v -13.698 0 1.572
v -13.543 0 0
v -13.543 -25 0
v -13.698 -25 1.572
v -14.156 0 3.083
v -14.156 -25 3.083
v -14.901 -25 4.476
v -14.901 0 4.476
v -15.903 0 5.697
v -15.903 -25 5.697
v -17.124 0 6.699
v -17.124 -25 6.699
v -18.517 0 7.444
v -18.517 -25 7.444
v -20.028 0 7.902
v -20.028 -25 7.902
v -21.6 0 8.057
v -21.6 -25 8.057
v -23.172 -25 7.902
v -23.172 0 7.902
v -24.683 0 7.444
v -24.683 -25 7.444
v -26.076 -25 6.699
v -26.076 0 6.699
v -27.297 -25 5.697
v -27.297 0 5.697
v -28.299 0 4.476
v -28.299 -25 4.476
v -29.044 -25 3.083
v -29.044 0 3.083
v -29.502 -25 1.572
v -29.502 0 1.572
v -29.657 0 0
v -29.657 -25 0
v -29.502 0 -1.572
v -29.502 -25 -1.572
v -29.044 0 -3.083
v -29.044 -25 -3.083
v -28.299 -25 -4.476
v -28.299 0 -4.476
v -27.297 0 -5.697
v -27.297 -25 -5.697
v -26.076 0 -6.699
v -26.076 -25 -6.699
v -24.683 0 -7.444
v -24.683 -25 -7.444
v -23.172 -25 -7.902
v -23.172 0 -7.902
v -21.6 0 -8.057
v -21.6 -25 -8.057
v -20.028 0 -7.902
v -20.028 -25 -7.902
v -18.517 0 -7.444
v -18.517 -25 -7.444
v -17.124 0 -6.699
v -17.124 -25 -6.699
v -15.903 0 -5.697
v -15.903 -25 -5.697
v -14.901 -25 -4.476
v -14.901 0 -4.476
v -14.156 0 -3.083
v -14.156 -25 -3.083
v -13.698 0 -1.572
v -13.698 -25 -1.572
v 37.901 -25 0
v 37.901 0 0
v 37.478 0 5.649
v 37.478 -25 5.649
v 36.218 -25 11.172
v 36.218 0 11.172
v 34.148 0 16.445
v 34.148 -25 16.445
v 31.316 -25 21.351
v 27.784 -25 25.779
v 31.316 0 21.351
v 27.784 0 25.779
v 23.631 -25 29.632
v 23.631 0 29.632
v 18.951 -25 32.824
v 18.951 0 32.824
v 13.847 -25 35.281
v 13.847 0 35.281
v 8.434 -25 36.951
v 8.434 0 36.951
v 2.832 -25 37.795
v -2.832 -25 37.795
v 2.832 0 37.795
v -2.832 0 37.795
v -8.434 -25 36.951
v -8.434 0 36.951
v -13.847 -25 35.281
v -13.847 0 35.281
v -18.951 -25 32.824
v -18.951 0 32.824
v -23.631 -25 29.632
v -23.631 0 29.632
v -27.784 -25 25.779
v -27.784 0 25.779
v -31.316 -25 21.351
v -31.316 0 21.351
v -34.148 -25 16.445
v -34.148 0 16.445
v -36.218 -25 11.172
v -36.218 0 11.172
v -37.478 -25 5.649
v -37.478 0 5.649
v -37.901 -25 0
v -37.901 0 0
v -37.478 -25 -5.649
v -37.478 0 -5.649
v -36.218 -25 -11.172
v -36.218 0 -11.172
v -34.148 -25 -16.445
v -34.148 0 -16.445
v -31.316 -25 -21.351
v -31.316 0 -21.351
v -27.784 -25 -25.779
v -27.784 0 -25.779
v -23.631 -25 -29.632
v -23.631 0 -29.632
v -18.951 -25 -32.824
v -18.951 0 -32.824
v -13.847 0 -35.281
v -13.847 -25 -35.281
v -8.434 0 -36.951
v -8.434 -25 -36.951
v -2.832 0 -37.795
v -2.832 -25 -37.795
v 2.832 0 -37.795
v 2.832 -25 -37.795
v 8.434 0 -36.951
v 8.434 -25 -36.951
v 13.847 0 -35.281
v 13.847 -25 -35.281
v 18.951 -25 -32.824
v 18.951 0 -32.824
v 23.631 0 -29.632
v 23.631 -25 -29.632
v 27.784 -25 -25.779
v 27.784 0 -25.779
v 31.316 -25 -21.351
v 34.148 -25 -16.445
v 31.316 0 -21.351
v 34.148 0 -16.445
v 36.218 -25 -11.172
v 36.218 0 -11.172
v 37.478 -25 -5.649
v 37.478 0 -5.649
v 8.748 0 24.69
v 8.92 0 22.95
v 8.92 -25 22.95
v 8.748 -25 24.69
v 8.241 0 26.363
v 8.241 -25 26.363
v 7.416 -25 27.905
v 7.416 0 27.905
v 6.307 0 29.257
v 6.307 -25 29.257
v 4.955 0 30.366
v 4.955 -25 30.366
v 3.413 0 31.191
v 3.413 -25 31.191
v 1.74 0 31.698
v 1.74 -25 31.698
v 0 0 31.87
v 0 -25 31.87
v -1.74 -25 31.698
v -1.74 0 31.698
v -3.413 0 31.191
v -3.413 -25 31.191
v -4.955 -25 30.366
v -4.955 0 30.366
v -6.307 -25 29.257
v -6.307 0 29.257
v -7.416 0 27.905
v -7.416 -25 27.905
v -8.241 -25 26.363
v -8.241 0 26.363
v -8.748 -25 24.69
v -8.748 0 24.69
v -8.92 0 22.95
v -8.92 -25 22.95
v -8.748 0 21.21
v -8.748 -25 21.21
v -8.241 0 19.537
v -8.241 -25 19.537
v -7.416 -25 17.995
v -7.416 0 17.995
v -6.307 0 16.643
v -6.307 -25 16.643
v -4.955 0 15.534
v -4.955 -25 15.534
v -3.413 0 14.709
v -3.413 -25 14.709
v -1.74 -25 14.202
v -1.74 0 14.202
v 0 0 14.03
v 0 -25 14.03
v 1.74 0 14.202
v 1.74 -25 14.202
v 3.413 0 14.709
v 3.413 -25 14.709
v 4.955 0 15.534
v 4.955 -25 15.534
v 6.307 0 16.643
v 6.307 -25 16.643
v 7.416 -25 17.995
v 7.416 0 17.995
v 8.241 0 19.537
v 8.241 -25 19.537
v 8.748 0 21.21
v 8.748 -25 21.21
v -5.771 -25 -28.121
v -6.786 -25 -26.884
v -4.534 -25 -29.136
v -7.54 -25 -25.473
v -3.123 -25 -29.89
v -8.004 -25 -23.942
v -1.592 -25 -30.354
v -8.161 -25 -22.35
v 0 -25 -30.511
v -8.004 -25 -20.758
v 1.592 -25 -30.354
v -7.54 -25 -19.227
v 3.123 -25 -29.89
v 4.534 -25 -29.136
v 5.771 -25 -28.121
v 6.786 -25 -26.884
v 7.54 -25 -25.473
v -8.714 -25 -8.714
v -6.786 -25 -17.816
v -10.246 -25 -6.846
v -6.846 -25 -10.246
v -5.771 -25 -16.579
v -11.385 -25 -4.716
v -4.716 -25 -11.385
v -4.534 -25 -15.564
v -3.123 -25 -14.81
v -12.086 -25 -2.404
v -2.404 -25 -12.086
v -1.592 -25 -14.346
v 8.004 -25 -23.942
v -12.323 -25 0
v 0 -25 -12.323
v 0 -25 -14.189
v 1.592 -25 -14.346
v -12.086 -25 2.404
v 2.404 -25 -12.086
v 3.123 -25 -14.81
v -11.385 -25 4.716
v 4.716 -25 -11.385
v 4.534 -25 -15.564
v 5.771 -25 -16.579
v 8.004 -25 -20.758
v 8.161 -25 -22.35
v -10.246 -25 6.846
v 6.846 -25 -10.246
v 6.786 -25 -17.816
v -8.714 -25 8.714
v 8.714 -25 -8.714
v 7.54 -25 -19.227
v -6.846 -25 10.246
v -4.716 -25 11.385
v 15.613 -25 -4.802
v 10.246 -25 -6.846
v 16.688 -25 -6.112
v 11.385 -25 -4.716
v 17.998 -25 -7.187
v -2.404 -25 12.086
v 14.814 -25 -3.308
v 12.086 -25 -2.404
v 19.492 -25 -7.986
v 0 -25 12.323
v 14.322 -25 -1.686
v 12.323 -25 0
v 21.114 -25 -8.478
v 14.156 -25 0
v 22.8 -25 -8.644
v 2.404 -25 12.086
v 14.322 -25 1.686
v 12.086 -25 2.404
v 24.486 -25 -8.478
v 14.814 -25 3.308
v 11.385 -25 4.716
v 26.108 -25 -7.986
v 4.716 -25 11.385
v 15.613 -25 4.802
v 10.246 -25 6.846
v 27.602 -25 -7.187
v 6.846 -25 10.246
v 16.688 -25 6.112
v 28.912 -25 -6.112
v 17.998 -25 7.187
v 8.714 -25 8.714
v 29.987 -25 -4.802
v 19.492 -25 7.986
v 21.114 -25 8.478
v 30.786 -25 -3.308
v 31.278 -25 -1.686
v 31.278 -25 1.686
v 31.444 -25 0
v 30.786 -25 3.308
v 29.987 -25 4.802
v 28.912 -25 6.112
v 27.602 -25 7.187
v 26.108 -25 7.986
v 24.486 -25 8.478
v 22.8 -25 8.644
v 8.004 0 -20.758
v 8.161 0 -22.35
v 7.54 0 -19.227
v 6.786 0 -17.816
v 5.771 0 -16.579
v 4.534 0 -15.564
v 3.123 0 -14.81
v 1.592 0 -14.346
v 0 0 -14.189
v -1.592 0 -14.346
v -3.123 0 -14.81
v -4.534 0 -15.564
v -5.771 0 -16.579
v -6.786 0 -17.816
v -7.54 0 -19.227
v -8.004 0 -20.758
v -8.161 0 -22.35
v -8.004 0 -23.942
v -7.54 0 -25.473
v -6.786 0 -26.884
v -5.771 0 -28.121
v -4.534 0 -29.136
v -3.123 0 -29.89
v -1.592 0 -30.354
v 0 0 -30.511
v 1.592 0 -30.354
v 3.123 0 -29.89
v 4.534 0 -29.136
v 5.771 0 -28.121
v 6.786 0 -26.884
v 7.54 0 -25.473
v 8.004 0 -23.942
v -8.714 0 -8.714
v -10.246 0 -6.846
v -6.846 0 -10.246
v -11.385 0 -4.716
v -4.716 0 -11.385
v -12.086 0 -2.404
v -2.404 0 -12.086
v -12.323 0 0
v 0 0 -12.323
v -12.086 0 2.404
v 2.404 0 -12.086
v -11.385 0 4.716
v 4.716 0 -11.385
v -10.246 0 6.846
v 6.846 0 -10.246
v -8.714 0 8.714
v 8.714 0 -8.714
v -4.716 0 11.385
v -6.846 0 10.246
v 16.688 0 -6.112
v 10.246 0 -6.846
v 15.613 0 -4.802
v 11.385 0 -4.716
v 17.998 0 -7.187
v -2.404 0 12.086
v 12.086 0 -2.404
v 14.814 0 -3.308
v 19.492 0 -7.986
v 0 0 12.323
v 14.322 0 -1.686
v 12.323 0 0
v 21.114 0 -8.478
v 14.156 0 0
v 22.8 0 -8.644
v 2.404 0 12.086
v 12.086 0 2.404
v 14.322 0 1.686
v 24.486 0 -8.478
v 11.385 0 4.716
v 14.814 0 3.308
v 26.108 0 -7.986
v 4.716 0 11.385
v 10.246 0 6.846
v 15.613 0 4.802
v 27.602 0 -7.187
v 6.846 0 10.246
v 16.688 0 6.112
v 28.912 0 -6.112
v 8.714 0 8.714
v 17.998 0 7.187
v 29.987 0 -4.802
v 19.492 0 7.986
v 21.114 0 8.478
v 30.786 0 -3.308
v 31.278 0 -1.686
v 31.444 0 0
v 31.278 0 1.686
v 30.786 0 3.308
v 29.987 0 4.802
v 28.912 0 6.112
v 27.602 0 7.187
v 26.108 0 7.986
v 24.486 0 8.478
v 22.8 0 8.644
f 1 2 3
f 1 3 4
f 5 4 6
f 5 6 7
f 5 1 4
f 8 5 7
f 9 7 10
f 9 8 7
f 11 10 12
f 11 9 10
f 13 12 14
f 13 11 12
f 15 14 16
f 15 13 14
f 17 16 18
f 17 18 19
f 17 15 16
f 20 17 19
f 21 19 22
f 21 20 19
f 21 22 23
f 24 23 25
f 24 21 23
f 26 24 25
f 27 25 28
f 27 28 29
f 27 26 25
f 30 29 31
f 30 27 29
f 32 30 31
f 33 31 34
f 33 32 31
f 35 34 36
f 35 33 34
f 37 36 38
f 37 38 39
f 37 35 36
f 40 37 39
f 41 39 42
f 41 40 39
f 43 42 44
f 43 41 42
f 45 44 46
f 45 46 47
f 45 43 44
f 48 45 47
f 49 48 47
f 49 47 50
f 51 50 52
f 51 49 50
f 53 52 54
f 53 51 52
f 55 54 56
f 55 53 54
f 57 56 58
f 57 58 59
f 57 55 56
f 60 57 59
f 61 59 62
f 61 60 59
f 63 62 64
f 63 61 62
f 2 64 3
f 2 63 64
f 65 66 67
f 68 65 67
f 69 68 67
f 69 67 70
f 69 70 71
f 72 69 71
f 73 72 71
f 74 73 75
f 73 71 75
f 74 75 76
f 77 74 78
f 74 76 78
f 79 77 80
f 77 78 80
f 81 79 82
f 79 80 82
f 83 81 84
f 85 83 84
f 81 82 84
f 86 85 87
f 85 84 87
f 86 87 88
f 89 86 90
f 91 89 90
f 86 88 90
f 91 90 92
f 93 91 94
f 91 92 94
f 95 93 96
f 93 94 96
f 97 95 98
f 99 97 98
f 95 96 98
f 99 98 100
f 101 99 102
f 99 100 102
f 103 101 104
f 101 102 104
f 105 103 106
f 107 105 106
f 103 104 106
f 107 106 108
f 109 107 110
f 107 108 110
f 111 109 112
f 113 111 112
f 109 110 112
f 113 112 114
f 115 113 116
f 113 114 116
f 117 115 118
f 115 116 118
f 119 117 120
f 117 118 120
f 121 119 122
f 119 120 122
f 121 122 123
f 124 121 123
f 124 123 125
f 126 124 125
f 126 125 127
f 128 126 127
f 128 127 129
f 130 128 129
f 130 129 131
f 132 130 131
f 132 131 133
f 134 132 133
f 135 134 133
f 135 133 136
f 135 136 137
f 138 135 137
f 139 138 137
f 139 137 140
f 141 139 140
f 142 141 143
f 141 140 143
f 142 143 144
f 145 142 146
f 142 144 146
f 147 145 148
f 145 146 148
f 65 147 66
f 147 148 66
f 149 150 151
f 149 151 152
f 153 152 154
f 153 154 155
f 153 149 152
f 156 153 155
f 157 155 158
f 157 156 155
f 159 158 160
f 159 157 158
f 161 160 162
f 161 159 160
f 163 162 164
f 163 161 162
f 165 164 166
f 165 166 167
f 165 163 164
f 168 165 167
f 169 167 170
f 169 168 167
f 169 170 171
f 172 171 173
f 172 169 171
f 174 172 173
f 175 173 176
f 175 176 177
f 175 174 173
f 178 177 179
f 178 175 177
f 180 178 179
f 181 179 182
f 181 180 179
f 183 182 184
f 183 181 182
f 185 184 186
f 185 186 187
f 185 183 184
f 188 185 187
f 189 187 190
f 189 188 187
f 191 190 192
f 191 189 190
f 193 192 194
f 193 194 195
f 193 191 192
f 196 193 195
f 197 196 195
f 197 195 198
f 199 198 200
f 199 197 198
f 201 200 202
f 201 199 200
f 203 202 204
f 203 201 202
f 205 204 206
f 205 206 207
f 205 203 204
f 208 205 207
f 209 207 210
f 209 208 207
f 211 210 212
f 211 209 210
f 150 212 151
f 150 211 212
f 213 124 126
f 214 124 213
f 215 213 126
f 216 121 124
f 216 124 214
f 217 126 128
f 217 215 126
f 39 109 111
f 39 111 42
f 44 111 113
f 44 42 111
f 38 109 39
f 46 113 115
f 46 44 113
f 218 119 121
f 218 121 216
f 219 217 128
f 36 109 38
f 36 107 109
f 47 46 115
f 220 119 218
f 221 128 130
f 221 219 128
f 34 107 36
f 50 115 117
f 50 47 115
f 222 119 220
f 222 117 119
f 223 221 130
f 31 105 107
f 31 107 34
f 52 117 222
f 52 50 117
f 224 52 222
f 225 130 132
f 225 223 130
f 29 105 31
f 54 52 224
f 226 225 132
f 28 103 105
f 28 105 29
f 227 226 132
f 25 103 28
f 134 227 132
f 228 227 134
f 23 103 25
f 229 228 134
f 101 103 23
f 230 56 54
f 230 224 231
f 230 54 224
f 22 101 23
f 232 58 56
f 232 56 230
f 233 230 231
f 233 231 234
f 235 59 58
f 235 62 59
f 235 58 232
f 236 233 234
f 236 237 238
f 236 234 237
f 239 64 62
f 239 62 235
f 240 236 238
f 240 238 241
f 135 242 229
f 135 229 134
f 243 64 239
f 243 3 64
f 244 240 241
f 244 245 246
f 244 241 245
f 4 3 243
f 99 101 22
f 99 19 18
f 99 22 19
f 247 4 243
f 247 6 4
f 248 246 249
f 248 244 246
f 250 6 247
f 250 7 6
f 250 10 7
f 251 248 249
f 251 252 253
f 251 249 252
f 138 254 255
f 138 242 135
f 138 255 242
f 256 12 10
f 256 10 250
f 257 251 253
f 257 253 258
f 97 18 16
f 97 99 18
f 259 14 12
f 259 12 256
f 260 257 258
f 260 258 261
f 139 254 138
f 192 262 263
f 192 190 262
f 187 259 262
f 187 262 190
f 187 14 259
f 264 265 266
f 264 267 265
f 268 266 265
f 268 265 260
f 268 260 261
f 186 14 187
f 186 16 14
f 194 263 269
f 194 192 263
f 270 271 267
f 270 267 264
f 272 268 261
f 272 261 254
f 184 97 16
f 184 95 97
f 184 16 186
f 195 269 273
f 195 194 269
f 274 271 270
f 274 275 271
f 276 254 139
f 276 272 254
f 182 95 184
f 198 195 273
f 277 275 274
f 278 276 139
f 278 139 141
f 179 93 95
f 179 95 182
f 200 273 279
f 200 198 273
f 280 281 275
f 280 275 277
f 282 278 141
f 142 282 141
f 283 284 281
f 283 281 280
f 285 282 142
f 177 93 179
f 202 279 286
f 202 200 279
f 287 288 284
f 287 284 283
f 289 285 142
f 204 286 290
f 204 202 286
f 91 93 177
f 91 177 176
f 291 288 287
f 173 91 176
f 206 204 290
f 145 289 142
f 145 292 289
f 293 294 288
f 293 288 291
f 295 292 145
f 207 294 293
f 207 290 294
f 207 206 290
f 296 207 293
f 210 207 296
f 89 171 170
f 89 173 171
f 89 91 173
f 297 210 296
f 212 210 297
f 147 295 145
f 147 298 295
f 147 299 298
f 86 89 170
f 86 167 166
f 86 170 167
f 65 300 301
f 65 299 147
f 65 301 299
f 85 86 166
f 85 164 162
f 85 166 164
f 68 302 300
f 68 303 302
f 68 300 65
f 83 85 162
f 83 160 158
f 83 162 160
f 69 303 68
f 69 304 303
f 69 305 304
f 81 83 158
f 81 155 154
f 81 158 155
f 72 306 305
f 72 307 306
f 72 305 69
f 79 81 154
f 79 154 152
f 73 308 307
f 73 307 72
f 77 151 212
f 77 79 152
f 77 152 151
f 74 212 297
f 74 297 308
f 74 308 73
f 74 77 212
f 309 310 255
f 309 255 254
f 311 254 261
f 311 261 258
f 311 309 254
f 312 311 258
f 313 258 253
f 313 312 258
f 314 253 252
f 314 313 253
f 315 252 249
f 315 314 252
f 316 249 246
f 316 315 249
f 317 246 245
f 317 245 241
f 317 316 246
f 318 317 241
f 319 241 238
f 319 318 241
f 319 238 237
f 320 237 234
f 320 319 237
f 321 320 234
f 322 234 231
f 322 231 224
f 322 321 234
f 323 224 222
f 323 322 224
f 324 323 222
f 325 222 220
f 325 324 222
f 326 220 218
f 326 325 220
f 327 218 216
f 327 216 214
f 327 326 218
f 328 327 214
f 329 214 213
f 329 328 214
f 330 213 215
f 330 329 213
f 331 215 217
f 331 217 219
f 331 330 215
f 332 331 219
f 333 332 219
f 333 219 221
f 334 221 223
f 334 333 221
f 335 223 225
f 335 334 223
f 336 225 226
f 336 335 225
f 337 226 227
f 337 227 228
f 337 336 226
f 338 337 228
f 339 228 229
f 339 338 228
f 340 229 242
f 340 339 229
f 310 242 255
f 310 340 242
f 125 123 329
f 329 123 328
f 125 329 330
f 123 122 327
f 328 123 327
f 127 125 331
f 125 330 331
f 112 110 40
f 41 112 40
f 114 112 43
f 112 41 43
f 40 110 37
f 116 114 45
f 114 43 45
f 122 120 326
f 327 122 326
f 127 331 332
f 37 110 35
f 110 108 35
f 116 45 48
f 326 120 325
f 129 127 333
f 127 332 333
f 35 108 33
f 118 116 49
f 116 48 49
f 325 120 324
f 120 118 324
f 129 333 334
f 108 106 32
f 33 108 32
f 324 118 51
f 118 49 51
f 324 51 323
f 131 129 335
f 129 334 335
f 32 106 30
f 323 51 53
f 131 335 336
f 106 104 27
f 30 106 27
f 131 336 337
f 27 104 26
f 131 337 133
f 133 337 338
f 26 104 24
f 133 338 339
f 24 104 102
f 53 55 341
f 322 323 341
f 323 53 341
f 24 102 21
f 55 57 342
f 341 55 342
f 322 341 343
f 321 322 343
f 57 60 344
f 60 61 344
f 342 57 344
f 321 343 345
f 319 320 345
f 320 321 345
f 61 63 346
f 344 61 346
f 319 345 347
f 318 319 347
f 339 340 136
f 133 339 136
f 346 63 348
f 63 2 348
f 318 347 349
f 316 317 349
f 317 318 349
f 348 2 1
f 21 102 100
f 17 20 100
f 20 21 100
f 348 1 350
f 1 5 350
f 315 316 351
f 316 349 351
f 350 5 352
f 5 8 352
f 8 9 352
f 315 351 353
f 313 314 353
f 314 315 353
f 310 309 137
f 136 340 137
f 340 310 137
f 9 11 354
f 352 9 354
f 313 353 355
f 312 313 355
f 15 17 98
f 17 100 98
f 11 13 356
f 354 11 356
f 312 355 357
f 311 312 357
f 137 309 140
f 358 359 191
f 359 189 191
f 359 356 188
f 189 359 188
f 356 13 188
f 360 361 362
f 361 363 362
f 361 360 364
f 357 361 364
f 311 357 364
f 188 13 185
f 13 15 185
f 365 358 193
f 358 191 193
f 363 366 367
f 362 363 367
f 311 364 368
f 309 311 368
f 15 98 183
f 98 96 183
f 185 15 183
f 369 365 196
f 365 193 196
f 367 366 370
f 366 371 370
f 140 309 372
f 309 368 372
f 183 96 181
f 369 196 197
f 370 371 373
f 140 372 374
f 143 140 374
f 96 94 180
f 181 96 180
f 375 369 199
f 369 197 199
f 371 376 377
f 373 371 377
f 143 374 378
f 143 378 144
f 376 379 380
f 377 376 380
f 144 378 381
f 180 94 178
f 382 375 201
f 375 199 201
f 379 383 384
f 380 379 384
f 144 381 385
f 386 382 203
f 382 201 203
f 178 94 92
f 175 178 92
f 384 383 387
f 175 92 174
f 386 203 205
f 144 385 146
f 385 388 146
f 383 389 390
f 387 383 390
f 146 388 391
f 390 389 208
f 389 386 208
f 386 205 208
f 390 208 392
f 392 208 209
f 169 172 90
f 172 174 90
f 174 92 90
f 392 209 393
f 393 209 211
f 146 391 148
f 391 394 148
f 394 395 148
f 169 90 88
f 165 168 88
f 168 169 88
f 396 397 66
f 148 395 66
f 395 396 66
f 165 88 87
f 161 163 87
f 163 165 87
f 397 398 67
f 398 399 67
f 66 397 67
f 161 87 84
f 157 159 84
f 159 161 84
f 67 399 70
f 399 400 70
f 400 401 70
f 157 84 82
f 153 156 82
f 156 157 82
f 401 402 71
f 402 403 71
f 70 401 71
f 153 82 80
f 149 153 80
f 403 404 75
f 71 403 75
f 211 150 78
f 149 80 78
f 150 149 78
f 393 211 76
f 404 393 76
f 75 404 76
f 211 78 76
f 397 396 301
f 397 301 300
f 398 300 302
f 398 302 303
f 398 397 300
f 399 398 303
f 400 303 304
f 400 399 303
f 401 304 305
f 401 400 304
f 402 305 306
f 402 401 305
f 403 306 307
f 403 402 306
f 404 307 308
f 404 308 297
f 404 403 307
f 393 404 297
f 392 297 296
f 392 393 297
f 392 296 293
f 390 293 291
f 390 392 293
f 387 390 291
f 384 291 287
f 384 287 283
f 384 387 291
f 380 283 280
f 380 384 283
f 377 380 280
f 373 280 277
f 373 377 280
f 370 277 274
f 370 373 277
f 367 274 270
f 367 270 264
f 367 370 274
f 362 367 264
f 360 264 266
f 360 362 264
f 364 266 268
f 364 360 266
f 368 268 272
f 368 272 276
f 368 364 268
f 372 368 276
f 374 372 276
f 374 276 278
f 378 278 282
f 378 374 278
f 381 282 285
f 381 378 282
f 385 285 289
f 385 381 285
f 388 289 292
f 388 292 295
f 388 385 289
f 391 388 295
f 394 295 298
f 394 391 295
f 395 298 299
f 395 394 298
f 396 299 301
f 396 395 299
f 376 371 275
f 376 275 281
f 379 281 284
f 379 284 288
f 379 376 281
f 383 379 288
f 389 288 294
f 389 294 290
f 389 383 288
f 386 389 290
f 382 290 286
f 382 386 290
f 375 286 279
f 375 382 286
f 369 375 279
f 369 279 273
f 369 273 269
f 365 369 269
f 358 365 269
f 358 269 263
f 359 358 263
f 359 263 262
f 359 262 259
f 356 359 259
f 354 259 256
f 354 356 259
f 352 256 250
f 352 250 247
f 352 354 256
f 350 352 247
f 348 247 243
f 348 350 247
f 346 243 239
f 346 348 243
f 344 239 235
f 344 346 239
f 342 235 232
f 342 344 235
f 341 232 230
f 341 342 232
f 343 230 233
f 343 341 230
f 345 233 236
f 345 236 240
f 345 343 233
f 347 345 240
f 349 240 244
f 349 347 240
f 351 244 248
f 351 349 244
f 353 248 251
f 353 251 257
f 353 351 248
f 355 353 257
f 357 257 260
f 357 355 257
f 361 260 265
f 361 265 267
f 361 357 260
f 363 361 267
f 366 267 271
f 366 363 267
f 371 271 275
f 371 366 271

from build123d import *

# Parameters (mm, degrees)
F0_R     = 37.901352
F0_R_2   = 34.351311
F0_R_3   = 8.160883
F0_R_4   = 8.05683
F0_R_5   = 12.322845
F0_R_6   = 8.644217
F0_R_7   = 8.919641
F1_DEPTH = 25


with BuildPart() as f1:
    # F0 (on Front) → F1 (new body)
    with BuildSketch(Plane.XZ):
        Circle(F0_R)
        Circle(F0_R_2, mode=Mode.SUBTRACT)
        Circle(F0_R_2)
        with Locations((0, -22.35)):
            Circle(F0_R_3, mode=Mode.SUBTRACT)
        with Locations((-21.600001, 0)):
            Circle(F0_R_4, mode=Mode.SUBTRACT)
        Circle(F0_R_5, mode=Mode.SUBTRACT)
        with Locations((22.8, 0)):
            Circle(F0_R_6, mode=Mode.SUBTRACT)
        with Locations((0, 22.950001)):
            Circle(F0_R_7, mode=Mode.SUBTRACT)
    extrude(amount=F1_DEPTH)


solid = f1.part
